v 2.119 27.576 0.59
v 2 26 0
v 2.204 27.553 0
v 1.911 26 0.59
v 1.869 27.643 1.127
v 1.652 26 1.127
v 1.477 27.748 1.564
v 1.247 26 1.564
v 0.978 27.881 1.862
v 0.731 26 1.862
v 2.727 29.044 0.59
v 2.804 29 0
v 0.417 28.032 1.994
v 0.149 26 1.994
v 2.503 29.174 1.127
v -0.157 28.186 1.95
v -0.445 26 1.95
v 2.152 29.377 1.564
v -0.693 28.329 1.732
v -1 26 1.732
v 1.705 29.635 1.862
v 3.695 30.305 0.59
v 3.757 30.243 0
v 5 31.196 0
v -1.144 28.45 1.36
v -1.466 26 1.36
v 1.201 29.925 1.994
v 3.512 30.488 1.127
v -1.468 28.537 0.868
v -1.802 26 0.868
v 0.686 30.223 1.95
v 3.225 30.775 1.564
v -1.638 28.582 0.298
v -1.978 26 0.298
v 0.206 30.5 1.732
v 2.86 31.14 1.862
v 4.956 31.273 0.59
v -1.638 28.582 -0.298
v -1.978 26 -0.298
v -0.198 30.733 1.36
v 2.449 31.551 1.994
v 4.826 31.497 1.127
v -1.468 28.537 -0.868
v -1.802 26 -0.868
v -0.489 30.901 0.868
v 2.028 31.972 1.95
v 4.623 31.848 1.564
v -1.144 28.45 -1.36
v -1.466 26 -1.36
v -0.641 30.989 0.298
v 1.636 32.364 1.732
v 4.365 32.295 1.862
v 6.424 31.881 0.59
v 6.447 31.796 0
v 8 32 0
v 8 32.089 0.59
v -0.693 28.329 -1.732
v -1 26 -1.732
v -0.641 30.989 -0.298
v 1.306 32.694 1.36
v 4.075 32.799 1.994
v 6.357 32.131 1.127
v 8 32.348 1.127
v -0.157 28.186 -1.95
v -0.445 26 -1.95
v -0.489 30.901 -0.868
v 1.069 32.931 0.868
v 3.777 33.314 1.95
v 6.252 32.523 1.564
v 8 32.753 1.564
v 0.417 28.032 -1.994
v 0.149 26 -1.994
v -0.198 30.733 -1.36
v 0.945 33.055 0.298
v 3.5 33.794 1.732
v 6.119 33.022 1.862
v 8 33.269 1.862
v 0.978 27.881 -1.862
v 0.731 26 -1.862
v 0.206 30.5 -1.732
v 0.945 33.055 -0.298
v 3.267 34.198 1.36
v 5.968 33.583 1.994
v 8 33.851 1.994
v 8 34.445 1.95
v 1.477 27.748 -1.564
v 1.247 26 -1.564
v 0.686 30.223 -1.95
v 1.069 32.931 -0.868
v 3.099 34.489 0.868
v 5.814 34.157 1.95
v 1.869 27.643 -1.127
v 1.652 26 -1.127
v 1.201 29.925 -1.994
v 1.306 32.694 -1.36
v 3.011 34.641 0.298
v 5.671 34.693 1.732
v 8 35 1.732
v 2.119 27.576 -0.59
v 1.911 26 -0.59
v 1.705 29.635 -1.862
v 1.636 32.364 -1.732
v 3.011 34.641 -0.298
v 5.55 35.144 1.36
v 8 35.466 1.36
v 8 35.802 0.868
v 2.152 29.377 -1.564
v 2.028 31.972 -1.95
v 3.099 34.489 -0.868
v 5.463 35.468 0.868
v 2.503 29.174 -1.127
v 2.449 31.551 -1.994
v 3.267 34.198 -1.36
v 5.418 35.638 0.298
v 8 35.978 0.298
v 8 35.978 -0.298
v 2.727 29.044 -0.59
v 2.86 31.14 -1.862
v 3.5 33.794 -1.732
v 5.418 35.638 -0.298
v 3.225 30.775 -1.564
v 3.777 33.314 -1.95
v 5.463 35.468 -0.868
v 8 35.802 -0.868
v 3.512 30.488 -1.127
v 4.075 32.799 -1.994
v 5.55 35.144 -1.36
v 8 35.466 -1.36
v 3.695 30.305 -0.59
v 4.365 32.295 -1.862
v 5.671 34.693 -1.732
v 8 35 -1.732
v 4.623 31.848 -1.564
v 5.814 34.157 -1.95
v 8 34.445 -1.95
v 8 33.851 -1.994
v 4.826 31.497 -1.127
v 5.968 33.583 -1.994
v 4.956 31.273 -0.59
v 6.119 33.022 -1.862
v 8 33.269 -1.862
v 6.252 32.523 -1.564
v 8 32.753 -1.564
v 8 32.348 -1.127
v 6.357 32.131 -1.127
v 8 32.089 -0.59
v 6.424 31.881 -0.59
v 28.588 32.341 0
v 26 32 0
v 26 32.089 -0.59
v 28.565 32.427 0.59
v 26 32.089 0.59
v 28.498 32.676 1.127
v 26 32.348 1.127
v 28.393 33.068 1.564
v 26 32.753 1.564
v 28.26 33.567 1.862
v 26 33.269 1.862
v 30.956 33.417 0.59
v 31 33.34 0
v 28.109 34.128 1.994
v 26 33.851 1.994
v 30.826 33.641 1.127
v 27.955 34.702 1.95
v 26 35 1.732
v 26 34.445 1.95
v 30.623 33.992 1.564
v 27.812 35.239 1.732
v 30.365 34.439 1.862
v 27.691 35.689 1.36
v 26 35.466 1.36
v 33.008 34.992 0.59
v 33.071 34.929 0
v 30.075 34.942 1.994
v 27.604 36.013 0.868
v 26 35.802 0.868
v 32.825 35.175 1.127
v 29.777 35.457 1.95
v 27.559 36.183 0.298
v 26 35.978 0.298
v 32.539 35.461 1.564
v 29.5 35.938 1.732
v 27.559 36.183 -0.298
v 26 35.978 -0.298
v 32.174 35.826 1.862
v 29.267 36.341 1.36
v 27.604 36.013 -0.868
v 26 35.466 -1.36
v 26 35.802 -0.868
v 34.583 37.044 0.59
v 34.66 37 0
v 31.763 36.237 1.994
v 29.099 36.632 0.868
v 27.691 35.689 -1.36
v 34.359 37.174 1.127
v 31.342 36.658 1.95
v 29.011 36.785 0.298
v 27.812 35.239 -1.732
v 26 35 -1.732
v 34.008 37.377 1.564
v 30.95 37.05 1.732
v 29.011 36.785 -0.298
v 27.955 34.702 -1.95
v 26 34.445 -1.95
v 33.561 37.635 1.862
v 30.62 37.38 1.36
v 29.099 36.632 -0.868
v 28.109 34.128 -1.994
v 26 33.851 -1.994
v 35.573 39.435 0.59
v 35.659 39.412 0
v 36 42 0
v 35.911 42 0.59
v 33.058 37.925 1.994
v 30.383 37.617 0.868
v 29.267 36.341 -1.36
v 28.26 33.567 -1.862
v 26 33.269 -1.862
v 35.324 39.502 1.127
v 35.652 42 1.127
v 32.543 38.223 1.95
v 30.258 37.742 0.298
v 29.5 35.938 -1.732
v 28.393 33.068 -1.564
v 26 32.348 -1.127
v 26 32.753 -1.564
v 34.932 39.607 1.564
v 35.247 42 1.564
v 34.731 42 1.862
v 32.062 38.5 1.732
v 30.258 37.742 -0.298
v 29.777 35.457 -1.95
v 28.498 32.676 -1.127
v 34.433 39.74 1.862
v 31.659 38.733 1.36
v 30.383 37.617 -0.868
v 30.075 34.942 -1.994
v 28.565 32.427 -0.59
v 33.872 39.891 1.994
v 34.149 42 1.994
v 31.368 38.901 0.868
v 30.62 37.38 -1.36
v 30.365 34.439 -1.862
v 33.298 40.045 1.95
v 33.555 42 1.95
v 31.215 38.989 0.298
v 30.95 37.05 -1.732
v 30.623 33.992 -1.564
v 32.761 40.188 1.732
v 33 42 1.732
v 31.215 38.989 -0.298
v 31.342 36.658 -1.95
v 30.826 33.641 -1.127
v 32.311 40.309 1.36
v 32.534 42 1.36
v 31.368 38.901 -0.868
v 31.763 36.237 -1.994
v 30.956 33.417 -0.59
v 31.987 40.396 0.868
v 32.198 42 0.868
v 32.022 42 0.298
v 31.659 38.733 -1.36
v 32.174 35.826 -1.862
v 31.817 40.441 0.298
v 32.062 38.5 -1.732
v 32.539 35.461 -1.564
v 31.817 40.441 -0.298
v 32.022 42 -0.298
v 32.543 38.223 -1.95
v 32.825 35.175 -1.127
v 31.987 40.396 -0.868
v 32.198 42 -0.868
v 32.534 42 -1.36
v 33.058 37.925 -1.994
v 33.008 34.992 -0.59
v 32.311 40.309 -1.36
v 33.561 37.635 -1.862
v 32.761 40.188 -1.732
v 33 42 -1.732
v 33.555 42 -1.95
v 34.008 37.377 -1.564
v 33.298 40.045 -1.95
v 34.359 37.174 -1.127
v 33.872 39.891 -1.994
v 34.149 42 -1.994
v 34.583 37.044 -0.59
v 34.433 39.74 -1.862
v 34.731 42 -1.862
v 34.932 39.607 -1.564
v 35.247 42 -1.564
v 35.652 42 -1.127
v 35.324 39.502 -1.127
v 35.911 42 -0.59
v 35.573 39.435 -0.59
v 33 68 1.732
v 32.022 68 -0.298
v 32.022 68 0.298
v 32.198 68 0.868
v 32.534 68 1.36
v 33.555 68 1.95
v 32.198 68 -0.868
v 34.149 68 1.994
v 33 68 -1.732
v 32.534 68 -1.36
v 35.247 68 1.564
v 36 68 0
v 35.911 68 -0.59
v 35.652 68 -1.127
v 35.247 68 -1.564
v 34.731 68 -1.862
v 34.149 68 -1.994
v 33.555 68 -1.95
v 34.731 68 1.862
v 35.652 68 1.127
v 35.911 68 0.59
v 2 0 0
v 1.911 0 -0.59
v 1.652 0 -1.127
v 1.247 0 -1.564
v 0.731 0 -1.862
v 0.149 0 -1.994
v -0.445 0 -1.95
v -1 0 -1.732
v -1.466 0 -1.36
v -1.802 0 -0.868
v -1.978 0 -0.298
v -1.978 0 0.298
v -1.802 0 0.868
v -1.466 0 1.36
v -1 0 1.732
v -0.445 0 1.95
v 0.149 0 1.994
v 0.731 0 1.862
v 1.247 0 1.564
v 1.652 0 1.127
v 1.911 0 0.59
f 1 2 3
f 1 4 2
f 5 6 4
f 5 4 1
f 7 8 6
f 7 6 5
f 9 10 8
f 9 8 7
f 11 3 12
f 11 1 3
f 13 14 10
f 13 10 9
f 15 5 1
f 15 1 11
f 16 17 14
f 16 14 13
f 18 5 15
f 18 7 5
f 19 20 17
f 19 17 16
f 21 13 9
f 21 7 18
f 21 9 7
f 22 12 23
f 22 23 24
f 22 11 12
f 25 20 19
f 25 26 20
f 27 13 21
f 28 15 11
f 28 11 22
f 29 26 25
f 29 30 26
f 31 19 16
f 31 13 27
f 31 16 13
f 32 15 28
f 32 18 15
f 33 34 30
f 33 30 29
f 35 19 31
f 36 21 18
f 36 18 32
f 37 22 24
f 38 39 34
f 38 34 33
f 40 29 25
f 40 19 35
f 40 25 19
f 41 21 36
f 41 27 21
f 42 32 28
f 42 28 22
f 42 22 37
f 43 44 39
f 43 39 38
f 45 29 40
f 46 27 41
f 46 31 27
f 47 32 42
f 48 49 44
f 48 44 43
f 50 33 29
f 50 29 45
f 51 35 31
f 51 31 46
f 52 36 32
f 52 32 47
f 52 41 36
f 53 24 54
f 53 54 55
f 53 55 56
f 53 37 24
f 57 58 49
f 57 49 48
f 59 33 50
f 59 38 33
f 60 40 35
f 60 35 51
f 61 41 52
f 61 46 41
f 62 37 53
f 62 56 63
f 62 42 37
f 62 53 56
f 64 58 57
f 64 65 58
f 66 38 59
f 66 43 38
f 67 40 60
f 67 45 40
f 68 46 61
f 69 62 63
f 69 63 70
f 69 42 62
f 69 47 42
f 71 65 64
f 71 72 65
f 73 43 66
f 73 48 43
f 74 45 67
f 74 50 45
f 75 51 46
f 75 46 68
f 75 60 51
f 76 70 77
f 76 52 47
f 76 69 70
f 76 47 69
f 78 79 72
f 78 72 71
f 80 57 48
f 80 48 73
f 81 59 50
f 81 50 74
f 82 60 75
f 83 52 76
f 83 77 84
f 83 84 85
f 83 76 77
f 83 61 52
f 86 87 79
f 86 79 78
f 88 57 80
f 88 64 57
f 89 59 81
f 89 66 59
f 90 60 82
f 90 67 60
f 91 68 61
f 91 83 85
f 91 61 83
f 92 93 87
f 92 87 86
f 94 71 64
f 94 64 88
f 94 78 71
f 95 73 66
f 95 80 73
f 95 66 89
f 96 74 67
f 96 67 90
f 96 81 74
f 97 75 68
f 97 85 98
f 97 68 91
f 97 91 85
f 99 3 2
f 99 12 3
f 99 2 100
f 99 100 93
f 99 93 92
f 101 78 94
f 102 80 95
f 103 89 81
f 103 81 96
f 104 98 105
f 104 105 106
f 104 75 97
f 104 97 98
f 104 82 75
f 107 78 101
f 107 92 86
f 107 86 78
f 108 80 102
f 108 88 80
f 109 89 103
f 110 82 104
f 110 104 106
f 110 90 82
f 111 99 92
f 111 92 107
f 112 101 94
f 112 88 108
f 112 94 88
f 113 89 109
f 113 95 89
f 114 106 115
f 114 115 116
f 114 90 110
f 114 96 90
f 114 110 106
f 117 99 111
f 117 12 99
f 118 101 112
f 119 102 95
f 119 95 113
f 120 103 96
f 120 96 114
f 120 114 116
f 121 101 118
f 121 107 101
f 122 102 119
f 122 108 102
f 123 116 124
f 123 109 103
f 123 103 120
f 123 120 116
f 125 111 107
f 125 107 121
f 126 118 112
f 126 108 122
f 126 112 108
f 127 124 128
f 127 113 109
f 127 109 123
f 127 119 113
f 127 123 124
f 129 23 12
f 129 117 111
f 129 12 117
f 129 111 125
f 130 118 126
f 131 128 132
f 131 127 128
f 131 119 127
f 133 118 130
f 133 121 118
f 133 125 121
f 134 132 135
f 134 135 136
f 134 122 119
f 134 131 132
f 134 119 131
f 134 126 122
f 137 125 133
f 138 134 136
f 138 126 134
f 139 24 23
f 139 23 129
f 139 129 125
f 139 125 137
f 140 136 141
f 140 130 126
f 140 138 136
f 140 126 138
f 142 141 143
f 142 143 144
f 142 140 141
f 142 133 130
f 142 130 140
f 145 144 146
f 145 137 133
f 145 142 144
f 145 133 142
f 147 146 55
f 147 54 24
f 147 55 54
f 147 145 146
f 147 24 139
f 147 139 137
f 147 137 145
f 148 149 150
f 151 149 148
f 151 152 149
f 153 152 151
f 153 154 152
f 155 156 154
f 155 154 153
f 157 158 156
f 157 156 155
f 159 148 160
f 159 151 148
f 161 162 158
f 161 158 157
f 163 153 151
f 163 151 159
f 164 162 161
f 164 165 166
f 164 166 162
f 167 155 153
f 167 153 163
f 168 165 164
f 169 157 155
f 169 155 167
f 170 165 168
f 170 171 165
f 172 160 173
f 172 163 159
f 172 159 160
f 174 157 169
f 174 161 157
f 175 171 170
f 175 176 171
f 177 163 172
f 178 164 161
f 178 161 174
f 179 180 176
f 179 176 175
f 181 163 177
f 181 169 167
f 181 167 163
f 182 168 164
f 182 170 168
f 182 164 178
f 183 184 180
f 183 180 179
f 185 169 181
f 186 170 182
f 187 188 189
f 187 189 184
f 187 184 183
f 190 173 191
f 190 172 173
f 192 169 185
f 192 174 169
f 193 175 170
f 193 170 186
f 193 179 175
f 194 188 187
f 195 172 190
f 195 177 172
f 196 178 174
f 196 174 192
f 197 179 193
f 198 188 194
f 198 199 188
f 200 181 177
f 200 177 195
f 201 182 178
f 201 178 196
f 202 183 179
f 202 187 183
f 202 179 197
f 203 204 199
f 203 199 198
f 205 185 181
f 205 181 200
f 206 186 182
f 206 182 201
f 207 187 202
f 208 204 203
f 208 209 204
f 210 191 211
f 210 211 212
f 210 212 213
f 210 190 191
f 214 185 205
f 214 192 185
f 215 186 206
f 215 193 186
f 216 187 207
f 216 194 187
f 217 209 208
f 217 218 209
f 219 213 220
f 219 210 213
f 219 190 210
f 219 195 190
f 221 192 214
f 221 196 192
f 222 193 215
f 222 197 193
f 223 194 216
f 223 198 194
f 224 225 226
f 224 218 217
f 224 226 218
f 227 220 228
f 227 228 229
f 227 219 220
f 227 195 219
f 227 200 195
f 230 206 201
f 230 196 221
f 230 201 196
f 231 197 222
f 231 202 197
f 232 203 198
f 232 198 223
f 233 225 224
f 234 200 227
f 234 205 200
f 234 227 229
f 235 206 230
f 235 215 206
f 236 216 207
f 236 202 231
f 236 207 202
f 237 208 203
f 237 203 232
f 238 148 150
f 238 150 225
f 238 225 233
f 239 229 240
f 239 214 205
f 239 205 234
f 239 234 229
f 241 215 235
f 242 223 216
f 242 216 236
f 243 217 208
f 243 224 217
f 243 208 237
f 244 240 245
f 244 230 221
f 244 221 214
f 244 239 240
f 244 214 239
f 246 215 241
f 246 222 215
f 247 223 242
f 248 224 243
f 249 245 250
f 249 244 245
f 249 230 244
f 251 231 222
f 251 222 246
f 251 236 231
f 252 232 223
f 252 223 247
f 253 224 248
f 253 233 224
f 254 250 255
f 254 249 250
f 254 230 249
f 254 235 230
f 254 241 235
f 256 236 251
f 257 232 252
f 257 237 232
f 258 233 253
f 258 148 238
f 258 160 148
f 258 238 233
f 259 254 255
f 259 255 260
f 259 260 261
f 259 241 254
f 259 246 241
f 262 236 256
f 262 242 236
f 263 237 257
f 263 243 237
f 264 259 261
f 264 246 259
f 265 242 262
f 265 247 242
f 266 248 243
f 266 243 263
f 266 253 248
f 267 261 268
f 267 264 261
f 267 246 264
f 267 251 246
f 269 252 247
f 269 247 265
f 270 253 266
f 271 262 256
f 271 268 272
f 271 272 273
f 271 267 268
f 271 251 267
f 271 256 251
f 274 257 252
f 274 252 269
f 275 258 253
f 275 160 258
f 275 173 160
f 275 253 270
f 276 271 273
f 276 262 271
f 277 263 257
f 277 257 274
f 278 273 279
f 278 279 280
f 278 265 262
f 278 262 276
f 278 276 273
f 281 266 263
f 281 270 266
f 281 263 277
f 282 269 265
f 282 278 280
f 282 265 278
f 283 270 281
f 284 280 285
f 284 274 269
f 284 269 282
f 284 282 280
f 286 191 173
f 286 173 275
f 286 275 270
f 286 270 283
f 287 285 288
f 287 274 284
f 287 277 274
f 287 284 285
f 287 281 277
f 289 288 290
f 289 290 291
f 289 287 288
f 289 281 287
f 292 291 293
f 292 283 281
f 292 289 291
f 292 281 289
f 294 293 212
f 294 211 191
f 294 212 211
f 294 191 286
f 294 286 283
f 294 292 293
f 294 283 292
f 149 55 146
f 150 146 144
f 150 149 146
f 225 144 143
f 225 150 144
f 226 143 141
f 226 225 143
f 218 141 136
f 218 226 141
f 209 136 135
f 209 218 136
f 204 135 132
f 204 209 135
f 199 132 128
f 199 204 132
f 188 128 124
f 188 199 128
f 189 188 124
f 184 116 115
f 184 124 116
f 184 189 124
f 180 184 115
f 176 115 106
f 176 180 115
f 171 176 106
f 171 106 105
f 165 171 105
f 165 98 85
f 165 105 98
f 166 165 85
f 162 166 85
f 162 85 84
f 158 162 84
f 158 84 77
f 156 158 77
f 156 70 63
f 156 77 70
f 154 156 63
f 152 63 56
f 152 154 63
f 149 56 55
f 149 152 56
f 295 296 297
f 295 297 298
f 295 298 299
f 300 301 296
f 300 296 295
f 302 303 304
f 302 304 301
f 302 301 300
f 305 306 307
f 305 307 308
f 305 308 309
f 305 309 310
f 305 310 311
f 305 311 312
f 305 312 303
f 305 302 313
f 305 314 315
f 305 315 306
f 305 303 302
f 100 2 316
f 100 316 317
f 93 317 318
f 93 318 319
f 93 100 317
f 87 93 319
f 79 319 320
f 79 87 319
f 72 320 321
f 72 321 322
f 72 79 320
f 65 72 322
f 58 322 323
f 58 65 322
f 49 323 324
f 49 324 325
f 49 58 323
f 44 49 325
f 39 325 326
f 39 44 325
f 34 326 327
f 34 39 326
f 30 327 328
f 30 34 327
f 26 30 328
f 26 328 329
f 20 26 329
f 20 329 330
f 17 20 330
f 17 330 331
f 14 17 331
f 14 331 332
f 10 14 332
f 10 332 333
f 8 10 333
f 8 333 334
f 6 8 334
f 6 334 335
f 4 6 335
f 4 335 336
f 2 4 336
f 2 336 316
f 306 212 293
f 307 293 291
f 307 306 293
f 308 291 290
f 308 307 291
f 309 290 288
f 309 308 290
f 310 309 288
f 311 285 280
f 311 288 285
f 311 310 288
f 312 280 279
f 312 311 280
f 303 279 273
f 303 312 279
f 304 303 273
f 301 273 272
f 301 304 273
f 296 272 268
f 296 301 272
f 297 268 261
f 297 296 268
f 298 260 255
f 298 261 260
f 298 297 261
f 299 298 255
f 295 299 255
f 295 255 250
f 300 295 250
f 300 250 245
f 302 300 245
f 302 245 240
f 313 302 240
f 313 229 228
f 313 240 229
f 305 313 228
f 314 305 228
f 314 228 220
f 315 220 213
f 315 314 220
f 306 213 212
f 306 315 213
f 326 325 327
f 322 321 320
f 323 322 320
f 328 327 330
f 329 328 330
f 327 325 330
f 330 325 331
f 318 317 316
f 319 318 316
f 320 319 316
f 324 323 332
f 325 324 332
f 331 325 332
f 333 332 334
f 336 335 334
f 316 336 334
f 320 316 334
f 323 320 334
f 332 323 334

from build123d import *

# Parameters (mm, degrees)
SKETCH_18_R = 2


with BuildPart() as part:
    # ｽｲｰﾌﾟ6: sweep along a path in ｽｹｯﾁ19
    with BuildLine(Plane.XY) as sweep_6_path:
        Line((0, 0), (0, 26))
        ThreePointArc((0, 26), (2.343145751, 31.656854249), (8, 34))
        Line((8, 34), (26, 34))
        ThreePointArc((26, 34), (31.656854249, 36.343145751), (34, 42))
        Line((34, 42), (34, 68))
    # ｽｹｯﾁ18 → ｽｲｰﾌﾟ6 (sweep)
    with BuildSketch(Plane(origin=(0, 0, 0), x_dir=(1, 0, 0), z_dir=(0, 1, 0))):
        Circle(SKETCH_18_R)
    sweep(path=sweep_6_path.line)


solid = part.part
